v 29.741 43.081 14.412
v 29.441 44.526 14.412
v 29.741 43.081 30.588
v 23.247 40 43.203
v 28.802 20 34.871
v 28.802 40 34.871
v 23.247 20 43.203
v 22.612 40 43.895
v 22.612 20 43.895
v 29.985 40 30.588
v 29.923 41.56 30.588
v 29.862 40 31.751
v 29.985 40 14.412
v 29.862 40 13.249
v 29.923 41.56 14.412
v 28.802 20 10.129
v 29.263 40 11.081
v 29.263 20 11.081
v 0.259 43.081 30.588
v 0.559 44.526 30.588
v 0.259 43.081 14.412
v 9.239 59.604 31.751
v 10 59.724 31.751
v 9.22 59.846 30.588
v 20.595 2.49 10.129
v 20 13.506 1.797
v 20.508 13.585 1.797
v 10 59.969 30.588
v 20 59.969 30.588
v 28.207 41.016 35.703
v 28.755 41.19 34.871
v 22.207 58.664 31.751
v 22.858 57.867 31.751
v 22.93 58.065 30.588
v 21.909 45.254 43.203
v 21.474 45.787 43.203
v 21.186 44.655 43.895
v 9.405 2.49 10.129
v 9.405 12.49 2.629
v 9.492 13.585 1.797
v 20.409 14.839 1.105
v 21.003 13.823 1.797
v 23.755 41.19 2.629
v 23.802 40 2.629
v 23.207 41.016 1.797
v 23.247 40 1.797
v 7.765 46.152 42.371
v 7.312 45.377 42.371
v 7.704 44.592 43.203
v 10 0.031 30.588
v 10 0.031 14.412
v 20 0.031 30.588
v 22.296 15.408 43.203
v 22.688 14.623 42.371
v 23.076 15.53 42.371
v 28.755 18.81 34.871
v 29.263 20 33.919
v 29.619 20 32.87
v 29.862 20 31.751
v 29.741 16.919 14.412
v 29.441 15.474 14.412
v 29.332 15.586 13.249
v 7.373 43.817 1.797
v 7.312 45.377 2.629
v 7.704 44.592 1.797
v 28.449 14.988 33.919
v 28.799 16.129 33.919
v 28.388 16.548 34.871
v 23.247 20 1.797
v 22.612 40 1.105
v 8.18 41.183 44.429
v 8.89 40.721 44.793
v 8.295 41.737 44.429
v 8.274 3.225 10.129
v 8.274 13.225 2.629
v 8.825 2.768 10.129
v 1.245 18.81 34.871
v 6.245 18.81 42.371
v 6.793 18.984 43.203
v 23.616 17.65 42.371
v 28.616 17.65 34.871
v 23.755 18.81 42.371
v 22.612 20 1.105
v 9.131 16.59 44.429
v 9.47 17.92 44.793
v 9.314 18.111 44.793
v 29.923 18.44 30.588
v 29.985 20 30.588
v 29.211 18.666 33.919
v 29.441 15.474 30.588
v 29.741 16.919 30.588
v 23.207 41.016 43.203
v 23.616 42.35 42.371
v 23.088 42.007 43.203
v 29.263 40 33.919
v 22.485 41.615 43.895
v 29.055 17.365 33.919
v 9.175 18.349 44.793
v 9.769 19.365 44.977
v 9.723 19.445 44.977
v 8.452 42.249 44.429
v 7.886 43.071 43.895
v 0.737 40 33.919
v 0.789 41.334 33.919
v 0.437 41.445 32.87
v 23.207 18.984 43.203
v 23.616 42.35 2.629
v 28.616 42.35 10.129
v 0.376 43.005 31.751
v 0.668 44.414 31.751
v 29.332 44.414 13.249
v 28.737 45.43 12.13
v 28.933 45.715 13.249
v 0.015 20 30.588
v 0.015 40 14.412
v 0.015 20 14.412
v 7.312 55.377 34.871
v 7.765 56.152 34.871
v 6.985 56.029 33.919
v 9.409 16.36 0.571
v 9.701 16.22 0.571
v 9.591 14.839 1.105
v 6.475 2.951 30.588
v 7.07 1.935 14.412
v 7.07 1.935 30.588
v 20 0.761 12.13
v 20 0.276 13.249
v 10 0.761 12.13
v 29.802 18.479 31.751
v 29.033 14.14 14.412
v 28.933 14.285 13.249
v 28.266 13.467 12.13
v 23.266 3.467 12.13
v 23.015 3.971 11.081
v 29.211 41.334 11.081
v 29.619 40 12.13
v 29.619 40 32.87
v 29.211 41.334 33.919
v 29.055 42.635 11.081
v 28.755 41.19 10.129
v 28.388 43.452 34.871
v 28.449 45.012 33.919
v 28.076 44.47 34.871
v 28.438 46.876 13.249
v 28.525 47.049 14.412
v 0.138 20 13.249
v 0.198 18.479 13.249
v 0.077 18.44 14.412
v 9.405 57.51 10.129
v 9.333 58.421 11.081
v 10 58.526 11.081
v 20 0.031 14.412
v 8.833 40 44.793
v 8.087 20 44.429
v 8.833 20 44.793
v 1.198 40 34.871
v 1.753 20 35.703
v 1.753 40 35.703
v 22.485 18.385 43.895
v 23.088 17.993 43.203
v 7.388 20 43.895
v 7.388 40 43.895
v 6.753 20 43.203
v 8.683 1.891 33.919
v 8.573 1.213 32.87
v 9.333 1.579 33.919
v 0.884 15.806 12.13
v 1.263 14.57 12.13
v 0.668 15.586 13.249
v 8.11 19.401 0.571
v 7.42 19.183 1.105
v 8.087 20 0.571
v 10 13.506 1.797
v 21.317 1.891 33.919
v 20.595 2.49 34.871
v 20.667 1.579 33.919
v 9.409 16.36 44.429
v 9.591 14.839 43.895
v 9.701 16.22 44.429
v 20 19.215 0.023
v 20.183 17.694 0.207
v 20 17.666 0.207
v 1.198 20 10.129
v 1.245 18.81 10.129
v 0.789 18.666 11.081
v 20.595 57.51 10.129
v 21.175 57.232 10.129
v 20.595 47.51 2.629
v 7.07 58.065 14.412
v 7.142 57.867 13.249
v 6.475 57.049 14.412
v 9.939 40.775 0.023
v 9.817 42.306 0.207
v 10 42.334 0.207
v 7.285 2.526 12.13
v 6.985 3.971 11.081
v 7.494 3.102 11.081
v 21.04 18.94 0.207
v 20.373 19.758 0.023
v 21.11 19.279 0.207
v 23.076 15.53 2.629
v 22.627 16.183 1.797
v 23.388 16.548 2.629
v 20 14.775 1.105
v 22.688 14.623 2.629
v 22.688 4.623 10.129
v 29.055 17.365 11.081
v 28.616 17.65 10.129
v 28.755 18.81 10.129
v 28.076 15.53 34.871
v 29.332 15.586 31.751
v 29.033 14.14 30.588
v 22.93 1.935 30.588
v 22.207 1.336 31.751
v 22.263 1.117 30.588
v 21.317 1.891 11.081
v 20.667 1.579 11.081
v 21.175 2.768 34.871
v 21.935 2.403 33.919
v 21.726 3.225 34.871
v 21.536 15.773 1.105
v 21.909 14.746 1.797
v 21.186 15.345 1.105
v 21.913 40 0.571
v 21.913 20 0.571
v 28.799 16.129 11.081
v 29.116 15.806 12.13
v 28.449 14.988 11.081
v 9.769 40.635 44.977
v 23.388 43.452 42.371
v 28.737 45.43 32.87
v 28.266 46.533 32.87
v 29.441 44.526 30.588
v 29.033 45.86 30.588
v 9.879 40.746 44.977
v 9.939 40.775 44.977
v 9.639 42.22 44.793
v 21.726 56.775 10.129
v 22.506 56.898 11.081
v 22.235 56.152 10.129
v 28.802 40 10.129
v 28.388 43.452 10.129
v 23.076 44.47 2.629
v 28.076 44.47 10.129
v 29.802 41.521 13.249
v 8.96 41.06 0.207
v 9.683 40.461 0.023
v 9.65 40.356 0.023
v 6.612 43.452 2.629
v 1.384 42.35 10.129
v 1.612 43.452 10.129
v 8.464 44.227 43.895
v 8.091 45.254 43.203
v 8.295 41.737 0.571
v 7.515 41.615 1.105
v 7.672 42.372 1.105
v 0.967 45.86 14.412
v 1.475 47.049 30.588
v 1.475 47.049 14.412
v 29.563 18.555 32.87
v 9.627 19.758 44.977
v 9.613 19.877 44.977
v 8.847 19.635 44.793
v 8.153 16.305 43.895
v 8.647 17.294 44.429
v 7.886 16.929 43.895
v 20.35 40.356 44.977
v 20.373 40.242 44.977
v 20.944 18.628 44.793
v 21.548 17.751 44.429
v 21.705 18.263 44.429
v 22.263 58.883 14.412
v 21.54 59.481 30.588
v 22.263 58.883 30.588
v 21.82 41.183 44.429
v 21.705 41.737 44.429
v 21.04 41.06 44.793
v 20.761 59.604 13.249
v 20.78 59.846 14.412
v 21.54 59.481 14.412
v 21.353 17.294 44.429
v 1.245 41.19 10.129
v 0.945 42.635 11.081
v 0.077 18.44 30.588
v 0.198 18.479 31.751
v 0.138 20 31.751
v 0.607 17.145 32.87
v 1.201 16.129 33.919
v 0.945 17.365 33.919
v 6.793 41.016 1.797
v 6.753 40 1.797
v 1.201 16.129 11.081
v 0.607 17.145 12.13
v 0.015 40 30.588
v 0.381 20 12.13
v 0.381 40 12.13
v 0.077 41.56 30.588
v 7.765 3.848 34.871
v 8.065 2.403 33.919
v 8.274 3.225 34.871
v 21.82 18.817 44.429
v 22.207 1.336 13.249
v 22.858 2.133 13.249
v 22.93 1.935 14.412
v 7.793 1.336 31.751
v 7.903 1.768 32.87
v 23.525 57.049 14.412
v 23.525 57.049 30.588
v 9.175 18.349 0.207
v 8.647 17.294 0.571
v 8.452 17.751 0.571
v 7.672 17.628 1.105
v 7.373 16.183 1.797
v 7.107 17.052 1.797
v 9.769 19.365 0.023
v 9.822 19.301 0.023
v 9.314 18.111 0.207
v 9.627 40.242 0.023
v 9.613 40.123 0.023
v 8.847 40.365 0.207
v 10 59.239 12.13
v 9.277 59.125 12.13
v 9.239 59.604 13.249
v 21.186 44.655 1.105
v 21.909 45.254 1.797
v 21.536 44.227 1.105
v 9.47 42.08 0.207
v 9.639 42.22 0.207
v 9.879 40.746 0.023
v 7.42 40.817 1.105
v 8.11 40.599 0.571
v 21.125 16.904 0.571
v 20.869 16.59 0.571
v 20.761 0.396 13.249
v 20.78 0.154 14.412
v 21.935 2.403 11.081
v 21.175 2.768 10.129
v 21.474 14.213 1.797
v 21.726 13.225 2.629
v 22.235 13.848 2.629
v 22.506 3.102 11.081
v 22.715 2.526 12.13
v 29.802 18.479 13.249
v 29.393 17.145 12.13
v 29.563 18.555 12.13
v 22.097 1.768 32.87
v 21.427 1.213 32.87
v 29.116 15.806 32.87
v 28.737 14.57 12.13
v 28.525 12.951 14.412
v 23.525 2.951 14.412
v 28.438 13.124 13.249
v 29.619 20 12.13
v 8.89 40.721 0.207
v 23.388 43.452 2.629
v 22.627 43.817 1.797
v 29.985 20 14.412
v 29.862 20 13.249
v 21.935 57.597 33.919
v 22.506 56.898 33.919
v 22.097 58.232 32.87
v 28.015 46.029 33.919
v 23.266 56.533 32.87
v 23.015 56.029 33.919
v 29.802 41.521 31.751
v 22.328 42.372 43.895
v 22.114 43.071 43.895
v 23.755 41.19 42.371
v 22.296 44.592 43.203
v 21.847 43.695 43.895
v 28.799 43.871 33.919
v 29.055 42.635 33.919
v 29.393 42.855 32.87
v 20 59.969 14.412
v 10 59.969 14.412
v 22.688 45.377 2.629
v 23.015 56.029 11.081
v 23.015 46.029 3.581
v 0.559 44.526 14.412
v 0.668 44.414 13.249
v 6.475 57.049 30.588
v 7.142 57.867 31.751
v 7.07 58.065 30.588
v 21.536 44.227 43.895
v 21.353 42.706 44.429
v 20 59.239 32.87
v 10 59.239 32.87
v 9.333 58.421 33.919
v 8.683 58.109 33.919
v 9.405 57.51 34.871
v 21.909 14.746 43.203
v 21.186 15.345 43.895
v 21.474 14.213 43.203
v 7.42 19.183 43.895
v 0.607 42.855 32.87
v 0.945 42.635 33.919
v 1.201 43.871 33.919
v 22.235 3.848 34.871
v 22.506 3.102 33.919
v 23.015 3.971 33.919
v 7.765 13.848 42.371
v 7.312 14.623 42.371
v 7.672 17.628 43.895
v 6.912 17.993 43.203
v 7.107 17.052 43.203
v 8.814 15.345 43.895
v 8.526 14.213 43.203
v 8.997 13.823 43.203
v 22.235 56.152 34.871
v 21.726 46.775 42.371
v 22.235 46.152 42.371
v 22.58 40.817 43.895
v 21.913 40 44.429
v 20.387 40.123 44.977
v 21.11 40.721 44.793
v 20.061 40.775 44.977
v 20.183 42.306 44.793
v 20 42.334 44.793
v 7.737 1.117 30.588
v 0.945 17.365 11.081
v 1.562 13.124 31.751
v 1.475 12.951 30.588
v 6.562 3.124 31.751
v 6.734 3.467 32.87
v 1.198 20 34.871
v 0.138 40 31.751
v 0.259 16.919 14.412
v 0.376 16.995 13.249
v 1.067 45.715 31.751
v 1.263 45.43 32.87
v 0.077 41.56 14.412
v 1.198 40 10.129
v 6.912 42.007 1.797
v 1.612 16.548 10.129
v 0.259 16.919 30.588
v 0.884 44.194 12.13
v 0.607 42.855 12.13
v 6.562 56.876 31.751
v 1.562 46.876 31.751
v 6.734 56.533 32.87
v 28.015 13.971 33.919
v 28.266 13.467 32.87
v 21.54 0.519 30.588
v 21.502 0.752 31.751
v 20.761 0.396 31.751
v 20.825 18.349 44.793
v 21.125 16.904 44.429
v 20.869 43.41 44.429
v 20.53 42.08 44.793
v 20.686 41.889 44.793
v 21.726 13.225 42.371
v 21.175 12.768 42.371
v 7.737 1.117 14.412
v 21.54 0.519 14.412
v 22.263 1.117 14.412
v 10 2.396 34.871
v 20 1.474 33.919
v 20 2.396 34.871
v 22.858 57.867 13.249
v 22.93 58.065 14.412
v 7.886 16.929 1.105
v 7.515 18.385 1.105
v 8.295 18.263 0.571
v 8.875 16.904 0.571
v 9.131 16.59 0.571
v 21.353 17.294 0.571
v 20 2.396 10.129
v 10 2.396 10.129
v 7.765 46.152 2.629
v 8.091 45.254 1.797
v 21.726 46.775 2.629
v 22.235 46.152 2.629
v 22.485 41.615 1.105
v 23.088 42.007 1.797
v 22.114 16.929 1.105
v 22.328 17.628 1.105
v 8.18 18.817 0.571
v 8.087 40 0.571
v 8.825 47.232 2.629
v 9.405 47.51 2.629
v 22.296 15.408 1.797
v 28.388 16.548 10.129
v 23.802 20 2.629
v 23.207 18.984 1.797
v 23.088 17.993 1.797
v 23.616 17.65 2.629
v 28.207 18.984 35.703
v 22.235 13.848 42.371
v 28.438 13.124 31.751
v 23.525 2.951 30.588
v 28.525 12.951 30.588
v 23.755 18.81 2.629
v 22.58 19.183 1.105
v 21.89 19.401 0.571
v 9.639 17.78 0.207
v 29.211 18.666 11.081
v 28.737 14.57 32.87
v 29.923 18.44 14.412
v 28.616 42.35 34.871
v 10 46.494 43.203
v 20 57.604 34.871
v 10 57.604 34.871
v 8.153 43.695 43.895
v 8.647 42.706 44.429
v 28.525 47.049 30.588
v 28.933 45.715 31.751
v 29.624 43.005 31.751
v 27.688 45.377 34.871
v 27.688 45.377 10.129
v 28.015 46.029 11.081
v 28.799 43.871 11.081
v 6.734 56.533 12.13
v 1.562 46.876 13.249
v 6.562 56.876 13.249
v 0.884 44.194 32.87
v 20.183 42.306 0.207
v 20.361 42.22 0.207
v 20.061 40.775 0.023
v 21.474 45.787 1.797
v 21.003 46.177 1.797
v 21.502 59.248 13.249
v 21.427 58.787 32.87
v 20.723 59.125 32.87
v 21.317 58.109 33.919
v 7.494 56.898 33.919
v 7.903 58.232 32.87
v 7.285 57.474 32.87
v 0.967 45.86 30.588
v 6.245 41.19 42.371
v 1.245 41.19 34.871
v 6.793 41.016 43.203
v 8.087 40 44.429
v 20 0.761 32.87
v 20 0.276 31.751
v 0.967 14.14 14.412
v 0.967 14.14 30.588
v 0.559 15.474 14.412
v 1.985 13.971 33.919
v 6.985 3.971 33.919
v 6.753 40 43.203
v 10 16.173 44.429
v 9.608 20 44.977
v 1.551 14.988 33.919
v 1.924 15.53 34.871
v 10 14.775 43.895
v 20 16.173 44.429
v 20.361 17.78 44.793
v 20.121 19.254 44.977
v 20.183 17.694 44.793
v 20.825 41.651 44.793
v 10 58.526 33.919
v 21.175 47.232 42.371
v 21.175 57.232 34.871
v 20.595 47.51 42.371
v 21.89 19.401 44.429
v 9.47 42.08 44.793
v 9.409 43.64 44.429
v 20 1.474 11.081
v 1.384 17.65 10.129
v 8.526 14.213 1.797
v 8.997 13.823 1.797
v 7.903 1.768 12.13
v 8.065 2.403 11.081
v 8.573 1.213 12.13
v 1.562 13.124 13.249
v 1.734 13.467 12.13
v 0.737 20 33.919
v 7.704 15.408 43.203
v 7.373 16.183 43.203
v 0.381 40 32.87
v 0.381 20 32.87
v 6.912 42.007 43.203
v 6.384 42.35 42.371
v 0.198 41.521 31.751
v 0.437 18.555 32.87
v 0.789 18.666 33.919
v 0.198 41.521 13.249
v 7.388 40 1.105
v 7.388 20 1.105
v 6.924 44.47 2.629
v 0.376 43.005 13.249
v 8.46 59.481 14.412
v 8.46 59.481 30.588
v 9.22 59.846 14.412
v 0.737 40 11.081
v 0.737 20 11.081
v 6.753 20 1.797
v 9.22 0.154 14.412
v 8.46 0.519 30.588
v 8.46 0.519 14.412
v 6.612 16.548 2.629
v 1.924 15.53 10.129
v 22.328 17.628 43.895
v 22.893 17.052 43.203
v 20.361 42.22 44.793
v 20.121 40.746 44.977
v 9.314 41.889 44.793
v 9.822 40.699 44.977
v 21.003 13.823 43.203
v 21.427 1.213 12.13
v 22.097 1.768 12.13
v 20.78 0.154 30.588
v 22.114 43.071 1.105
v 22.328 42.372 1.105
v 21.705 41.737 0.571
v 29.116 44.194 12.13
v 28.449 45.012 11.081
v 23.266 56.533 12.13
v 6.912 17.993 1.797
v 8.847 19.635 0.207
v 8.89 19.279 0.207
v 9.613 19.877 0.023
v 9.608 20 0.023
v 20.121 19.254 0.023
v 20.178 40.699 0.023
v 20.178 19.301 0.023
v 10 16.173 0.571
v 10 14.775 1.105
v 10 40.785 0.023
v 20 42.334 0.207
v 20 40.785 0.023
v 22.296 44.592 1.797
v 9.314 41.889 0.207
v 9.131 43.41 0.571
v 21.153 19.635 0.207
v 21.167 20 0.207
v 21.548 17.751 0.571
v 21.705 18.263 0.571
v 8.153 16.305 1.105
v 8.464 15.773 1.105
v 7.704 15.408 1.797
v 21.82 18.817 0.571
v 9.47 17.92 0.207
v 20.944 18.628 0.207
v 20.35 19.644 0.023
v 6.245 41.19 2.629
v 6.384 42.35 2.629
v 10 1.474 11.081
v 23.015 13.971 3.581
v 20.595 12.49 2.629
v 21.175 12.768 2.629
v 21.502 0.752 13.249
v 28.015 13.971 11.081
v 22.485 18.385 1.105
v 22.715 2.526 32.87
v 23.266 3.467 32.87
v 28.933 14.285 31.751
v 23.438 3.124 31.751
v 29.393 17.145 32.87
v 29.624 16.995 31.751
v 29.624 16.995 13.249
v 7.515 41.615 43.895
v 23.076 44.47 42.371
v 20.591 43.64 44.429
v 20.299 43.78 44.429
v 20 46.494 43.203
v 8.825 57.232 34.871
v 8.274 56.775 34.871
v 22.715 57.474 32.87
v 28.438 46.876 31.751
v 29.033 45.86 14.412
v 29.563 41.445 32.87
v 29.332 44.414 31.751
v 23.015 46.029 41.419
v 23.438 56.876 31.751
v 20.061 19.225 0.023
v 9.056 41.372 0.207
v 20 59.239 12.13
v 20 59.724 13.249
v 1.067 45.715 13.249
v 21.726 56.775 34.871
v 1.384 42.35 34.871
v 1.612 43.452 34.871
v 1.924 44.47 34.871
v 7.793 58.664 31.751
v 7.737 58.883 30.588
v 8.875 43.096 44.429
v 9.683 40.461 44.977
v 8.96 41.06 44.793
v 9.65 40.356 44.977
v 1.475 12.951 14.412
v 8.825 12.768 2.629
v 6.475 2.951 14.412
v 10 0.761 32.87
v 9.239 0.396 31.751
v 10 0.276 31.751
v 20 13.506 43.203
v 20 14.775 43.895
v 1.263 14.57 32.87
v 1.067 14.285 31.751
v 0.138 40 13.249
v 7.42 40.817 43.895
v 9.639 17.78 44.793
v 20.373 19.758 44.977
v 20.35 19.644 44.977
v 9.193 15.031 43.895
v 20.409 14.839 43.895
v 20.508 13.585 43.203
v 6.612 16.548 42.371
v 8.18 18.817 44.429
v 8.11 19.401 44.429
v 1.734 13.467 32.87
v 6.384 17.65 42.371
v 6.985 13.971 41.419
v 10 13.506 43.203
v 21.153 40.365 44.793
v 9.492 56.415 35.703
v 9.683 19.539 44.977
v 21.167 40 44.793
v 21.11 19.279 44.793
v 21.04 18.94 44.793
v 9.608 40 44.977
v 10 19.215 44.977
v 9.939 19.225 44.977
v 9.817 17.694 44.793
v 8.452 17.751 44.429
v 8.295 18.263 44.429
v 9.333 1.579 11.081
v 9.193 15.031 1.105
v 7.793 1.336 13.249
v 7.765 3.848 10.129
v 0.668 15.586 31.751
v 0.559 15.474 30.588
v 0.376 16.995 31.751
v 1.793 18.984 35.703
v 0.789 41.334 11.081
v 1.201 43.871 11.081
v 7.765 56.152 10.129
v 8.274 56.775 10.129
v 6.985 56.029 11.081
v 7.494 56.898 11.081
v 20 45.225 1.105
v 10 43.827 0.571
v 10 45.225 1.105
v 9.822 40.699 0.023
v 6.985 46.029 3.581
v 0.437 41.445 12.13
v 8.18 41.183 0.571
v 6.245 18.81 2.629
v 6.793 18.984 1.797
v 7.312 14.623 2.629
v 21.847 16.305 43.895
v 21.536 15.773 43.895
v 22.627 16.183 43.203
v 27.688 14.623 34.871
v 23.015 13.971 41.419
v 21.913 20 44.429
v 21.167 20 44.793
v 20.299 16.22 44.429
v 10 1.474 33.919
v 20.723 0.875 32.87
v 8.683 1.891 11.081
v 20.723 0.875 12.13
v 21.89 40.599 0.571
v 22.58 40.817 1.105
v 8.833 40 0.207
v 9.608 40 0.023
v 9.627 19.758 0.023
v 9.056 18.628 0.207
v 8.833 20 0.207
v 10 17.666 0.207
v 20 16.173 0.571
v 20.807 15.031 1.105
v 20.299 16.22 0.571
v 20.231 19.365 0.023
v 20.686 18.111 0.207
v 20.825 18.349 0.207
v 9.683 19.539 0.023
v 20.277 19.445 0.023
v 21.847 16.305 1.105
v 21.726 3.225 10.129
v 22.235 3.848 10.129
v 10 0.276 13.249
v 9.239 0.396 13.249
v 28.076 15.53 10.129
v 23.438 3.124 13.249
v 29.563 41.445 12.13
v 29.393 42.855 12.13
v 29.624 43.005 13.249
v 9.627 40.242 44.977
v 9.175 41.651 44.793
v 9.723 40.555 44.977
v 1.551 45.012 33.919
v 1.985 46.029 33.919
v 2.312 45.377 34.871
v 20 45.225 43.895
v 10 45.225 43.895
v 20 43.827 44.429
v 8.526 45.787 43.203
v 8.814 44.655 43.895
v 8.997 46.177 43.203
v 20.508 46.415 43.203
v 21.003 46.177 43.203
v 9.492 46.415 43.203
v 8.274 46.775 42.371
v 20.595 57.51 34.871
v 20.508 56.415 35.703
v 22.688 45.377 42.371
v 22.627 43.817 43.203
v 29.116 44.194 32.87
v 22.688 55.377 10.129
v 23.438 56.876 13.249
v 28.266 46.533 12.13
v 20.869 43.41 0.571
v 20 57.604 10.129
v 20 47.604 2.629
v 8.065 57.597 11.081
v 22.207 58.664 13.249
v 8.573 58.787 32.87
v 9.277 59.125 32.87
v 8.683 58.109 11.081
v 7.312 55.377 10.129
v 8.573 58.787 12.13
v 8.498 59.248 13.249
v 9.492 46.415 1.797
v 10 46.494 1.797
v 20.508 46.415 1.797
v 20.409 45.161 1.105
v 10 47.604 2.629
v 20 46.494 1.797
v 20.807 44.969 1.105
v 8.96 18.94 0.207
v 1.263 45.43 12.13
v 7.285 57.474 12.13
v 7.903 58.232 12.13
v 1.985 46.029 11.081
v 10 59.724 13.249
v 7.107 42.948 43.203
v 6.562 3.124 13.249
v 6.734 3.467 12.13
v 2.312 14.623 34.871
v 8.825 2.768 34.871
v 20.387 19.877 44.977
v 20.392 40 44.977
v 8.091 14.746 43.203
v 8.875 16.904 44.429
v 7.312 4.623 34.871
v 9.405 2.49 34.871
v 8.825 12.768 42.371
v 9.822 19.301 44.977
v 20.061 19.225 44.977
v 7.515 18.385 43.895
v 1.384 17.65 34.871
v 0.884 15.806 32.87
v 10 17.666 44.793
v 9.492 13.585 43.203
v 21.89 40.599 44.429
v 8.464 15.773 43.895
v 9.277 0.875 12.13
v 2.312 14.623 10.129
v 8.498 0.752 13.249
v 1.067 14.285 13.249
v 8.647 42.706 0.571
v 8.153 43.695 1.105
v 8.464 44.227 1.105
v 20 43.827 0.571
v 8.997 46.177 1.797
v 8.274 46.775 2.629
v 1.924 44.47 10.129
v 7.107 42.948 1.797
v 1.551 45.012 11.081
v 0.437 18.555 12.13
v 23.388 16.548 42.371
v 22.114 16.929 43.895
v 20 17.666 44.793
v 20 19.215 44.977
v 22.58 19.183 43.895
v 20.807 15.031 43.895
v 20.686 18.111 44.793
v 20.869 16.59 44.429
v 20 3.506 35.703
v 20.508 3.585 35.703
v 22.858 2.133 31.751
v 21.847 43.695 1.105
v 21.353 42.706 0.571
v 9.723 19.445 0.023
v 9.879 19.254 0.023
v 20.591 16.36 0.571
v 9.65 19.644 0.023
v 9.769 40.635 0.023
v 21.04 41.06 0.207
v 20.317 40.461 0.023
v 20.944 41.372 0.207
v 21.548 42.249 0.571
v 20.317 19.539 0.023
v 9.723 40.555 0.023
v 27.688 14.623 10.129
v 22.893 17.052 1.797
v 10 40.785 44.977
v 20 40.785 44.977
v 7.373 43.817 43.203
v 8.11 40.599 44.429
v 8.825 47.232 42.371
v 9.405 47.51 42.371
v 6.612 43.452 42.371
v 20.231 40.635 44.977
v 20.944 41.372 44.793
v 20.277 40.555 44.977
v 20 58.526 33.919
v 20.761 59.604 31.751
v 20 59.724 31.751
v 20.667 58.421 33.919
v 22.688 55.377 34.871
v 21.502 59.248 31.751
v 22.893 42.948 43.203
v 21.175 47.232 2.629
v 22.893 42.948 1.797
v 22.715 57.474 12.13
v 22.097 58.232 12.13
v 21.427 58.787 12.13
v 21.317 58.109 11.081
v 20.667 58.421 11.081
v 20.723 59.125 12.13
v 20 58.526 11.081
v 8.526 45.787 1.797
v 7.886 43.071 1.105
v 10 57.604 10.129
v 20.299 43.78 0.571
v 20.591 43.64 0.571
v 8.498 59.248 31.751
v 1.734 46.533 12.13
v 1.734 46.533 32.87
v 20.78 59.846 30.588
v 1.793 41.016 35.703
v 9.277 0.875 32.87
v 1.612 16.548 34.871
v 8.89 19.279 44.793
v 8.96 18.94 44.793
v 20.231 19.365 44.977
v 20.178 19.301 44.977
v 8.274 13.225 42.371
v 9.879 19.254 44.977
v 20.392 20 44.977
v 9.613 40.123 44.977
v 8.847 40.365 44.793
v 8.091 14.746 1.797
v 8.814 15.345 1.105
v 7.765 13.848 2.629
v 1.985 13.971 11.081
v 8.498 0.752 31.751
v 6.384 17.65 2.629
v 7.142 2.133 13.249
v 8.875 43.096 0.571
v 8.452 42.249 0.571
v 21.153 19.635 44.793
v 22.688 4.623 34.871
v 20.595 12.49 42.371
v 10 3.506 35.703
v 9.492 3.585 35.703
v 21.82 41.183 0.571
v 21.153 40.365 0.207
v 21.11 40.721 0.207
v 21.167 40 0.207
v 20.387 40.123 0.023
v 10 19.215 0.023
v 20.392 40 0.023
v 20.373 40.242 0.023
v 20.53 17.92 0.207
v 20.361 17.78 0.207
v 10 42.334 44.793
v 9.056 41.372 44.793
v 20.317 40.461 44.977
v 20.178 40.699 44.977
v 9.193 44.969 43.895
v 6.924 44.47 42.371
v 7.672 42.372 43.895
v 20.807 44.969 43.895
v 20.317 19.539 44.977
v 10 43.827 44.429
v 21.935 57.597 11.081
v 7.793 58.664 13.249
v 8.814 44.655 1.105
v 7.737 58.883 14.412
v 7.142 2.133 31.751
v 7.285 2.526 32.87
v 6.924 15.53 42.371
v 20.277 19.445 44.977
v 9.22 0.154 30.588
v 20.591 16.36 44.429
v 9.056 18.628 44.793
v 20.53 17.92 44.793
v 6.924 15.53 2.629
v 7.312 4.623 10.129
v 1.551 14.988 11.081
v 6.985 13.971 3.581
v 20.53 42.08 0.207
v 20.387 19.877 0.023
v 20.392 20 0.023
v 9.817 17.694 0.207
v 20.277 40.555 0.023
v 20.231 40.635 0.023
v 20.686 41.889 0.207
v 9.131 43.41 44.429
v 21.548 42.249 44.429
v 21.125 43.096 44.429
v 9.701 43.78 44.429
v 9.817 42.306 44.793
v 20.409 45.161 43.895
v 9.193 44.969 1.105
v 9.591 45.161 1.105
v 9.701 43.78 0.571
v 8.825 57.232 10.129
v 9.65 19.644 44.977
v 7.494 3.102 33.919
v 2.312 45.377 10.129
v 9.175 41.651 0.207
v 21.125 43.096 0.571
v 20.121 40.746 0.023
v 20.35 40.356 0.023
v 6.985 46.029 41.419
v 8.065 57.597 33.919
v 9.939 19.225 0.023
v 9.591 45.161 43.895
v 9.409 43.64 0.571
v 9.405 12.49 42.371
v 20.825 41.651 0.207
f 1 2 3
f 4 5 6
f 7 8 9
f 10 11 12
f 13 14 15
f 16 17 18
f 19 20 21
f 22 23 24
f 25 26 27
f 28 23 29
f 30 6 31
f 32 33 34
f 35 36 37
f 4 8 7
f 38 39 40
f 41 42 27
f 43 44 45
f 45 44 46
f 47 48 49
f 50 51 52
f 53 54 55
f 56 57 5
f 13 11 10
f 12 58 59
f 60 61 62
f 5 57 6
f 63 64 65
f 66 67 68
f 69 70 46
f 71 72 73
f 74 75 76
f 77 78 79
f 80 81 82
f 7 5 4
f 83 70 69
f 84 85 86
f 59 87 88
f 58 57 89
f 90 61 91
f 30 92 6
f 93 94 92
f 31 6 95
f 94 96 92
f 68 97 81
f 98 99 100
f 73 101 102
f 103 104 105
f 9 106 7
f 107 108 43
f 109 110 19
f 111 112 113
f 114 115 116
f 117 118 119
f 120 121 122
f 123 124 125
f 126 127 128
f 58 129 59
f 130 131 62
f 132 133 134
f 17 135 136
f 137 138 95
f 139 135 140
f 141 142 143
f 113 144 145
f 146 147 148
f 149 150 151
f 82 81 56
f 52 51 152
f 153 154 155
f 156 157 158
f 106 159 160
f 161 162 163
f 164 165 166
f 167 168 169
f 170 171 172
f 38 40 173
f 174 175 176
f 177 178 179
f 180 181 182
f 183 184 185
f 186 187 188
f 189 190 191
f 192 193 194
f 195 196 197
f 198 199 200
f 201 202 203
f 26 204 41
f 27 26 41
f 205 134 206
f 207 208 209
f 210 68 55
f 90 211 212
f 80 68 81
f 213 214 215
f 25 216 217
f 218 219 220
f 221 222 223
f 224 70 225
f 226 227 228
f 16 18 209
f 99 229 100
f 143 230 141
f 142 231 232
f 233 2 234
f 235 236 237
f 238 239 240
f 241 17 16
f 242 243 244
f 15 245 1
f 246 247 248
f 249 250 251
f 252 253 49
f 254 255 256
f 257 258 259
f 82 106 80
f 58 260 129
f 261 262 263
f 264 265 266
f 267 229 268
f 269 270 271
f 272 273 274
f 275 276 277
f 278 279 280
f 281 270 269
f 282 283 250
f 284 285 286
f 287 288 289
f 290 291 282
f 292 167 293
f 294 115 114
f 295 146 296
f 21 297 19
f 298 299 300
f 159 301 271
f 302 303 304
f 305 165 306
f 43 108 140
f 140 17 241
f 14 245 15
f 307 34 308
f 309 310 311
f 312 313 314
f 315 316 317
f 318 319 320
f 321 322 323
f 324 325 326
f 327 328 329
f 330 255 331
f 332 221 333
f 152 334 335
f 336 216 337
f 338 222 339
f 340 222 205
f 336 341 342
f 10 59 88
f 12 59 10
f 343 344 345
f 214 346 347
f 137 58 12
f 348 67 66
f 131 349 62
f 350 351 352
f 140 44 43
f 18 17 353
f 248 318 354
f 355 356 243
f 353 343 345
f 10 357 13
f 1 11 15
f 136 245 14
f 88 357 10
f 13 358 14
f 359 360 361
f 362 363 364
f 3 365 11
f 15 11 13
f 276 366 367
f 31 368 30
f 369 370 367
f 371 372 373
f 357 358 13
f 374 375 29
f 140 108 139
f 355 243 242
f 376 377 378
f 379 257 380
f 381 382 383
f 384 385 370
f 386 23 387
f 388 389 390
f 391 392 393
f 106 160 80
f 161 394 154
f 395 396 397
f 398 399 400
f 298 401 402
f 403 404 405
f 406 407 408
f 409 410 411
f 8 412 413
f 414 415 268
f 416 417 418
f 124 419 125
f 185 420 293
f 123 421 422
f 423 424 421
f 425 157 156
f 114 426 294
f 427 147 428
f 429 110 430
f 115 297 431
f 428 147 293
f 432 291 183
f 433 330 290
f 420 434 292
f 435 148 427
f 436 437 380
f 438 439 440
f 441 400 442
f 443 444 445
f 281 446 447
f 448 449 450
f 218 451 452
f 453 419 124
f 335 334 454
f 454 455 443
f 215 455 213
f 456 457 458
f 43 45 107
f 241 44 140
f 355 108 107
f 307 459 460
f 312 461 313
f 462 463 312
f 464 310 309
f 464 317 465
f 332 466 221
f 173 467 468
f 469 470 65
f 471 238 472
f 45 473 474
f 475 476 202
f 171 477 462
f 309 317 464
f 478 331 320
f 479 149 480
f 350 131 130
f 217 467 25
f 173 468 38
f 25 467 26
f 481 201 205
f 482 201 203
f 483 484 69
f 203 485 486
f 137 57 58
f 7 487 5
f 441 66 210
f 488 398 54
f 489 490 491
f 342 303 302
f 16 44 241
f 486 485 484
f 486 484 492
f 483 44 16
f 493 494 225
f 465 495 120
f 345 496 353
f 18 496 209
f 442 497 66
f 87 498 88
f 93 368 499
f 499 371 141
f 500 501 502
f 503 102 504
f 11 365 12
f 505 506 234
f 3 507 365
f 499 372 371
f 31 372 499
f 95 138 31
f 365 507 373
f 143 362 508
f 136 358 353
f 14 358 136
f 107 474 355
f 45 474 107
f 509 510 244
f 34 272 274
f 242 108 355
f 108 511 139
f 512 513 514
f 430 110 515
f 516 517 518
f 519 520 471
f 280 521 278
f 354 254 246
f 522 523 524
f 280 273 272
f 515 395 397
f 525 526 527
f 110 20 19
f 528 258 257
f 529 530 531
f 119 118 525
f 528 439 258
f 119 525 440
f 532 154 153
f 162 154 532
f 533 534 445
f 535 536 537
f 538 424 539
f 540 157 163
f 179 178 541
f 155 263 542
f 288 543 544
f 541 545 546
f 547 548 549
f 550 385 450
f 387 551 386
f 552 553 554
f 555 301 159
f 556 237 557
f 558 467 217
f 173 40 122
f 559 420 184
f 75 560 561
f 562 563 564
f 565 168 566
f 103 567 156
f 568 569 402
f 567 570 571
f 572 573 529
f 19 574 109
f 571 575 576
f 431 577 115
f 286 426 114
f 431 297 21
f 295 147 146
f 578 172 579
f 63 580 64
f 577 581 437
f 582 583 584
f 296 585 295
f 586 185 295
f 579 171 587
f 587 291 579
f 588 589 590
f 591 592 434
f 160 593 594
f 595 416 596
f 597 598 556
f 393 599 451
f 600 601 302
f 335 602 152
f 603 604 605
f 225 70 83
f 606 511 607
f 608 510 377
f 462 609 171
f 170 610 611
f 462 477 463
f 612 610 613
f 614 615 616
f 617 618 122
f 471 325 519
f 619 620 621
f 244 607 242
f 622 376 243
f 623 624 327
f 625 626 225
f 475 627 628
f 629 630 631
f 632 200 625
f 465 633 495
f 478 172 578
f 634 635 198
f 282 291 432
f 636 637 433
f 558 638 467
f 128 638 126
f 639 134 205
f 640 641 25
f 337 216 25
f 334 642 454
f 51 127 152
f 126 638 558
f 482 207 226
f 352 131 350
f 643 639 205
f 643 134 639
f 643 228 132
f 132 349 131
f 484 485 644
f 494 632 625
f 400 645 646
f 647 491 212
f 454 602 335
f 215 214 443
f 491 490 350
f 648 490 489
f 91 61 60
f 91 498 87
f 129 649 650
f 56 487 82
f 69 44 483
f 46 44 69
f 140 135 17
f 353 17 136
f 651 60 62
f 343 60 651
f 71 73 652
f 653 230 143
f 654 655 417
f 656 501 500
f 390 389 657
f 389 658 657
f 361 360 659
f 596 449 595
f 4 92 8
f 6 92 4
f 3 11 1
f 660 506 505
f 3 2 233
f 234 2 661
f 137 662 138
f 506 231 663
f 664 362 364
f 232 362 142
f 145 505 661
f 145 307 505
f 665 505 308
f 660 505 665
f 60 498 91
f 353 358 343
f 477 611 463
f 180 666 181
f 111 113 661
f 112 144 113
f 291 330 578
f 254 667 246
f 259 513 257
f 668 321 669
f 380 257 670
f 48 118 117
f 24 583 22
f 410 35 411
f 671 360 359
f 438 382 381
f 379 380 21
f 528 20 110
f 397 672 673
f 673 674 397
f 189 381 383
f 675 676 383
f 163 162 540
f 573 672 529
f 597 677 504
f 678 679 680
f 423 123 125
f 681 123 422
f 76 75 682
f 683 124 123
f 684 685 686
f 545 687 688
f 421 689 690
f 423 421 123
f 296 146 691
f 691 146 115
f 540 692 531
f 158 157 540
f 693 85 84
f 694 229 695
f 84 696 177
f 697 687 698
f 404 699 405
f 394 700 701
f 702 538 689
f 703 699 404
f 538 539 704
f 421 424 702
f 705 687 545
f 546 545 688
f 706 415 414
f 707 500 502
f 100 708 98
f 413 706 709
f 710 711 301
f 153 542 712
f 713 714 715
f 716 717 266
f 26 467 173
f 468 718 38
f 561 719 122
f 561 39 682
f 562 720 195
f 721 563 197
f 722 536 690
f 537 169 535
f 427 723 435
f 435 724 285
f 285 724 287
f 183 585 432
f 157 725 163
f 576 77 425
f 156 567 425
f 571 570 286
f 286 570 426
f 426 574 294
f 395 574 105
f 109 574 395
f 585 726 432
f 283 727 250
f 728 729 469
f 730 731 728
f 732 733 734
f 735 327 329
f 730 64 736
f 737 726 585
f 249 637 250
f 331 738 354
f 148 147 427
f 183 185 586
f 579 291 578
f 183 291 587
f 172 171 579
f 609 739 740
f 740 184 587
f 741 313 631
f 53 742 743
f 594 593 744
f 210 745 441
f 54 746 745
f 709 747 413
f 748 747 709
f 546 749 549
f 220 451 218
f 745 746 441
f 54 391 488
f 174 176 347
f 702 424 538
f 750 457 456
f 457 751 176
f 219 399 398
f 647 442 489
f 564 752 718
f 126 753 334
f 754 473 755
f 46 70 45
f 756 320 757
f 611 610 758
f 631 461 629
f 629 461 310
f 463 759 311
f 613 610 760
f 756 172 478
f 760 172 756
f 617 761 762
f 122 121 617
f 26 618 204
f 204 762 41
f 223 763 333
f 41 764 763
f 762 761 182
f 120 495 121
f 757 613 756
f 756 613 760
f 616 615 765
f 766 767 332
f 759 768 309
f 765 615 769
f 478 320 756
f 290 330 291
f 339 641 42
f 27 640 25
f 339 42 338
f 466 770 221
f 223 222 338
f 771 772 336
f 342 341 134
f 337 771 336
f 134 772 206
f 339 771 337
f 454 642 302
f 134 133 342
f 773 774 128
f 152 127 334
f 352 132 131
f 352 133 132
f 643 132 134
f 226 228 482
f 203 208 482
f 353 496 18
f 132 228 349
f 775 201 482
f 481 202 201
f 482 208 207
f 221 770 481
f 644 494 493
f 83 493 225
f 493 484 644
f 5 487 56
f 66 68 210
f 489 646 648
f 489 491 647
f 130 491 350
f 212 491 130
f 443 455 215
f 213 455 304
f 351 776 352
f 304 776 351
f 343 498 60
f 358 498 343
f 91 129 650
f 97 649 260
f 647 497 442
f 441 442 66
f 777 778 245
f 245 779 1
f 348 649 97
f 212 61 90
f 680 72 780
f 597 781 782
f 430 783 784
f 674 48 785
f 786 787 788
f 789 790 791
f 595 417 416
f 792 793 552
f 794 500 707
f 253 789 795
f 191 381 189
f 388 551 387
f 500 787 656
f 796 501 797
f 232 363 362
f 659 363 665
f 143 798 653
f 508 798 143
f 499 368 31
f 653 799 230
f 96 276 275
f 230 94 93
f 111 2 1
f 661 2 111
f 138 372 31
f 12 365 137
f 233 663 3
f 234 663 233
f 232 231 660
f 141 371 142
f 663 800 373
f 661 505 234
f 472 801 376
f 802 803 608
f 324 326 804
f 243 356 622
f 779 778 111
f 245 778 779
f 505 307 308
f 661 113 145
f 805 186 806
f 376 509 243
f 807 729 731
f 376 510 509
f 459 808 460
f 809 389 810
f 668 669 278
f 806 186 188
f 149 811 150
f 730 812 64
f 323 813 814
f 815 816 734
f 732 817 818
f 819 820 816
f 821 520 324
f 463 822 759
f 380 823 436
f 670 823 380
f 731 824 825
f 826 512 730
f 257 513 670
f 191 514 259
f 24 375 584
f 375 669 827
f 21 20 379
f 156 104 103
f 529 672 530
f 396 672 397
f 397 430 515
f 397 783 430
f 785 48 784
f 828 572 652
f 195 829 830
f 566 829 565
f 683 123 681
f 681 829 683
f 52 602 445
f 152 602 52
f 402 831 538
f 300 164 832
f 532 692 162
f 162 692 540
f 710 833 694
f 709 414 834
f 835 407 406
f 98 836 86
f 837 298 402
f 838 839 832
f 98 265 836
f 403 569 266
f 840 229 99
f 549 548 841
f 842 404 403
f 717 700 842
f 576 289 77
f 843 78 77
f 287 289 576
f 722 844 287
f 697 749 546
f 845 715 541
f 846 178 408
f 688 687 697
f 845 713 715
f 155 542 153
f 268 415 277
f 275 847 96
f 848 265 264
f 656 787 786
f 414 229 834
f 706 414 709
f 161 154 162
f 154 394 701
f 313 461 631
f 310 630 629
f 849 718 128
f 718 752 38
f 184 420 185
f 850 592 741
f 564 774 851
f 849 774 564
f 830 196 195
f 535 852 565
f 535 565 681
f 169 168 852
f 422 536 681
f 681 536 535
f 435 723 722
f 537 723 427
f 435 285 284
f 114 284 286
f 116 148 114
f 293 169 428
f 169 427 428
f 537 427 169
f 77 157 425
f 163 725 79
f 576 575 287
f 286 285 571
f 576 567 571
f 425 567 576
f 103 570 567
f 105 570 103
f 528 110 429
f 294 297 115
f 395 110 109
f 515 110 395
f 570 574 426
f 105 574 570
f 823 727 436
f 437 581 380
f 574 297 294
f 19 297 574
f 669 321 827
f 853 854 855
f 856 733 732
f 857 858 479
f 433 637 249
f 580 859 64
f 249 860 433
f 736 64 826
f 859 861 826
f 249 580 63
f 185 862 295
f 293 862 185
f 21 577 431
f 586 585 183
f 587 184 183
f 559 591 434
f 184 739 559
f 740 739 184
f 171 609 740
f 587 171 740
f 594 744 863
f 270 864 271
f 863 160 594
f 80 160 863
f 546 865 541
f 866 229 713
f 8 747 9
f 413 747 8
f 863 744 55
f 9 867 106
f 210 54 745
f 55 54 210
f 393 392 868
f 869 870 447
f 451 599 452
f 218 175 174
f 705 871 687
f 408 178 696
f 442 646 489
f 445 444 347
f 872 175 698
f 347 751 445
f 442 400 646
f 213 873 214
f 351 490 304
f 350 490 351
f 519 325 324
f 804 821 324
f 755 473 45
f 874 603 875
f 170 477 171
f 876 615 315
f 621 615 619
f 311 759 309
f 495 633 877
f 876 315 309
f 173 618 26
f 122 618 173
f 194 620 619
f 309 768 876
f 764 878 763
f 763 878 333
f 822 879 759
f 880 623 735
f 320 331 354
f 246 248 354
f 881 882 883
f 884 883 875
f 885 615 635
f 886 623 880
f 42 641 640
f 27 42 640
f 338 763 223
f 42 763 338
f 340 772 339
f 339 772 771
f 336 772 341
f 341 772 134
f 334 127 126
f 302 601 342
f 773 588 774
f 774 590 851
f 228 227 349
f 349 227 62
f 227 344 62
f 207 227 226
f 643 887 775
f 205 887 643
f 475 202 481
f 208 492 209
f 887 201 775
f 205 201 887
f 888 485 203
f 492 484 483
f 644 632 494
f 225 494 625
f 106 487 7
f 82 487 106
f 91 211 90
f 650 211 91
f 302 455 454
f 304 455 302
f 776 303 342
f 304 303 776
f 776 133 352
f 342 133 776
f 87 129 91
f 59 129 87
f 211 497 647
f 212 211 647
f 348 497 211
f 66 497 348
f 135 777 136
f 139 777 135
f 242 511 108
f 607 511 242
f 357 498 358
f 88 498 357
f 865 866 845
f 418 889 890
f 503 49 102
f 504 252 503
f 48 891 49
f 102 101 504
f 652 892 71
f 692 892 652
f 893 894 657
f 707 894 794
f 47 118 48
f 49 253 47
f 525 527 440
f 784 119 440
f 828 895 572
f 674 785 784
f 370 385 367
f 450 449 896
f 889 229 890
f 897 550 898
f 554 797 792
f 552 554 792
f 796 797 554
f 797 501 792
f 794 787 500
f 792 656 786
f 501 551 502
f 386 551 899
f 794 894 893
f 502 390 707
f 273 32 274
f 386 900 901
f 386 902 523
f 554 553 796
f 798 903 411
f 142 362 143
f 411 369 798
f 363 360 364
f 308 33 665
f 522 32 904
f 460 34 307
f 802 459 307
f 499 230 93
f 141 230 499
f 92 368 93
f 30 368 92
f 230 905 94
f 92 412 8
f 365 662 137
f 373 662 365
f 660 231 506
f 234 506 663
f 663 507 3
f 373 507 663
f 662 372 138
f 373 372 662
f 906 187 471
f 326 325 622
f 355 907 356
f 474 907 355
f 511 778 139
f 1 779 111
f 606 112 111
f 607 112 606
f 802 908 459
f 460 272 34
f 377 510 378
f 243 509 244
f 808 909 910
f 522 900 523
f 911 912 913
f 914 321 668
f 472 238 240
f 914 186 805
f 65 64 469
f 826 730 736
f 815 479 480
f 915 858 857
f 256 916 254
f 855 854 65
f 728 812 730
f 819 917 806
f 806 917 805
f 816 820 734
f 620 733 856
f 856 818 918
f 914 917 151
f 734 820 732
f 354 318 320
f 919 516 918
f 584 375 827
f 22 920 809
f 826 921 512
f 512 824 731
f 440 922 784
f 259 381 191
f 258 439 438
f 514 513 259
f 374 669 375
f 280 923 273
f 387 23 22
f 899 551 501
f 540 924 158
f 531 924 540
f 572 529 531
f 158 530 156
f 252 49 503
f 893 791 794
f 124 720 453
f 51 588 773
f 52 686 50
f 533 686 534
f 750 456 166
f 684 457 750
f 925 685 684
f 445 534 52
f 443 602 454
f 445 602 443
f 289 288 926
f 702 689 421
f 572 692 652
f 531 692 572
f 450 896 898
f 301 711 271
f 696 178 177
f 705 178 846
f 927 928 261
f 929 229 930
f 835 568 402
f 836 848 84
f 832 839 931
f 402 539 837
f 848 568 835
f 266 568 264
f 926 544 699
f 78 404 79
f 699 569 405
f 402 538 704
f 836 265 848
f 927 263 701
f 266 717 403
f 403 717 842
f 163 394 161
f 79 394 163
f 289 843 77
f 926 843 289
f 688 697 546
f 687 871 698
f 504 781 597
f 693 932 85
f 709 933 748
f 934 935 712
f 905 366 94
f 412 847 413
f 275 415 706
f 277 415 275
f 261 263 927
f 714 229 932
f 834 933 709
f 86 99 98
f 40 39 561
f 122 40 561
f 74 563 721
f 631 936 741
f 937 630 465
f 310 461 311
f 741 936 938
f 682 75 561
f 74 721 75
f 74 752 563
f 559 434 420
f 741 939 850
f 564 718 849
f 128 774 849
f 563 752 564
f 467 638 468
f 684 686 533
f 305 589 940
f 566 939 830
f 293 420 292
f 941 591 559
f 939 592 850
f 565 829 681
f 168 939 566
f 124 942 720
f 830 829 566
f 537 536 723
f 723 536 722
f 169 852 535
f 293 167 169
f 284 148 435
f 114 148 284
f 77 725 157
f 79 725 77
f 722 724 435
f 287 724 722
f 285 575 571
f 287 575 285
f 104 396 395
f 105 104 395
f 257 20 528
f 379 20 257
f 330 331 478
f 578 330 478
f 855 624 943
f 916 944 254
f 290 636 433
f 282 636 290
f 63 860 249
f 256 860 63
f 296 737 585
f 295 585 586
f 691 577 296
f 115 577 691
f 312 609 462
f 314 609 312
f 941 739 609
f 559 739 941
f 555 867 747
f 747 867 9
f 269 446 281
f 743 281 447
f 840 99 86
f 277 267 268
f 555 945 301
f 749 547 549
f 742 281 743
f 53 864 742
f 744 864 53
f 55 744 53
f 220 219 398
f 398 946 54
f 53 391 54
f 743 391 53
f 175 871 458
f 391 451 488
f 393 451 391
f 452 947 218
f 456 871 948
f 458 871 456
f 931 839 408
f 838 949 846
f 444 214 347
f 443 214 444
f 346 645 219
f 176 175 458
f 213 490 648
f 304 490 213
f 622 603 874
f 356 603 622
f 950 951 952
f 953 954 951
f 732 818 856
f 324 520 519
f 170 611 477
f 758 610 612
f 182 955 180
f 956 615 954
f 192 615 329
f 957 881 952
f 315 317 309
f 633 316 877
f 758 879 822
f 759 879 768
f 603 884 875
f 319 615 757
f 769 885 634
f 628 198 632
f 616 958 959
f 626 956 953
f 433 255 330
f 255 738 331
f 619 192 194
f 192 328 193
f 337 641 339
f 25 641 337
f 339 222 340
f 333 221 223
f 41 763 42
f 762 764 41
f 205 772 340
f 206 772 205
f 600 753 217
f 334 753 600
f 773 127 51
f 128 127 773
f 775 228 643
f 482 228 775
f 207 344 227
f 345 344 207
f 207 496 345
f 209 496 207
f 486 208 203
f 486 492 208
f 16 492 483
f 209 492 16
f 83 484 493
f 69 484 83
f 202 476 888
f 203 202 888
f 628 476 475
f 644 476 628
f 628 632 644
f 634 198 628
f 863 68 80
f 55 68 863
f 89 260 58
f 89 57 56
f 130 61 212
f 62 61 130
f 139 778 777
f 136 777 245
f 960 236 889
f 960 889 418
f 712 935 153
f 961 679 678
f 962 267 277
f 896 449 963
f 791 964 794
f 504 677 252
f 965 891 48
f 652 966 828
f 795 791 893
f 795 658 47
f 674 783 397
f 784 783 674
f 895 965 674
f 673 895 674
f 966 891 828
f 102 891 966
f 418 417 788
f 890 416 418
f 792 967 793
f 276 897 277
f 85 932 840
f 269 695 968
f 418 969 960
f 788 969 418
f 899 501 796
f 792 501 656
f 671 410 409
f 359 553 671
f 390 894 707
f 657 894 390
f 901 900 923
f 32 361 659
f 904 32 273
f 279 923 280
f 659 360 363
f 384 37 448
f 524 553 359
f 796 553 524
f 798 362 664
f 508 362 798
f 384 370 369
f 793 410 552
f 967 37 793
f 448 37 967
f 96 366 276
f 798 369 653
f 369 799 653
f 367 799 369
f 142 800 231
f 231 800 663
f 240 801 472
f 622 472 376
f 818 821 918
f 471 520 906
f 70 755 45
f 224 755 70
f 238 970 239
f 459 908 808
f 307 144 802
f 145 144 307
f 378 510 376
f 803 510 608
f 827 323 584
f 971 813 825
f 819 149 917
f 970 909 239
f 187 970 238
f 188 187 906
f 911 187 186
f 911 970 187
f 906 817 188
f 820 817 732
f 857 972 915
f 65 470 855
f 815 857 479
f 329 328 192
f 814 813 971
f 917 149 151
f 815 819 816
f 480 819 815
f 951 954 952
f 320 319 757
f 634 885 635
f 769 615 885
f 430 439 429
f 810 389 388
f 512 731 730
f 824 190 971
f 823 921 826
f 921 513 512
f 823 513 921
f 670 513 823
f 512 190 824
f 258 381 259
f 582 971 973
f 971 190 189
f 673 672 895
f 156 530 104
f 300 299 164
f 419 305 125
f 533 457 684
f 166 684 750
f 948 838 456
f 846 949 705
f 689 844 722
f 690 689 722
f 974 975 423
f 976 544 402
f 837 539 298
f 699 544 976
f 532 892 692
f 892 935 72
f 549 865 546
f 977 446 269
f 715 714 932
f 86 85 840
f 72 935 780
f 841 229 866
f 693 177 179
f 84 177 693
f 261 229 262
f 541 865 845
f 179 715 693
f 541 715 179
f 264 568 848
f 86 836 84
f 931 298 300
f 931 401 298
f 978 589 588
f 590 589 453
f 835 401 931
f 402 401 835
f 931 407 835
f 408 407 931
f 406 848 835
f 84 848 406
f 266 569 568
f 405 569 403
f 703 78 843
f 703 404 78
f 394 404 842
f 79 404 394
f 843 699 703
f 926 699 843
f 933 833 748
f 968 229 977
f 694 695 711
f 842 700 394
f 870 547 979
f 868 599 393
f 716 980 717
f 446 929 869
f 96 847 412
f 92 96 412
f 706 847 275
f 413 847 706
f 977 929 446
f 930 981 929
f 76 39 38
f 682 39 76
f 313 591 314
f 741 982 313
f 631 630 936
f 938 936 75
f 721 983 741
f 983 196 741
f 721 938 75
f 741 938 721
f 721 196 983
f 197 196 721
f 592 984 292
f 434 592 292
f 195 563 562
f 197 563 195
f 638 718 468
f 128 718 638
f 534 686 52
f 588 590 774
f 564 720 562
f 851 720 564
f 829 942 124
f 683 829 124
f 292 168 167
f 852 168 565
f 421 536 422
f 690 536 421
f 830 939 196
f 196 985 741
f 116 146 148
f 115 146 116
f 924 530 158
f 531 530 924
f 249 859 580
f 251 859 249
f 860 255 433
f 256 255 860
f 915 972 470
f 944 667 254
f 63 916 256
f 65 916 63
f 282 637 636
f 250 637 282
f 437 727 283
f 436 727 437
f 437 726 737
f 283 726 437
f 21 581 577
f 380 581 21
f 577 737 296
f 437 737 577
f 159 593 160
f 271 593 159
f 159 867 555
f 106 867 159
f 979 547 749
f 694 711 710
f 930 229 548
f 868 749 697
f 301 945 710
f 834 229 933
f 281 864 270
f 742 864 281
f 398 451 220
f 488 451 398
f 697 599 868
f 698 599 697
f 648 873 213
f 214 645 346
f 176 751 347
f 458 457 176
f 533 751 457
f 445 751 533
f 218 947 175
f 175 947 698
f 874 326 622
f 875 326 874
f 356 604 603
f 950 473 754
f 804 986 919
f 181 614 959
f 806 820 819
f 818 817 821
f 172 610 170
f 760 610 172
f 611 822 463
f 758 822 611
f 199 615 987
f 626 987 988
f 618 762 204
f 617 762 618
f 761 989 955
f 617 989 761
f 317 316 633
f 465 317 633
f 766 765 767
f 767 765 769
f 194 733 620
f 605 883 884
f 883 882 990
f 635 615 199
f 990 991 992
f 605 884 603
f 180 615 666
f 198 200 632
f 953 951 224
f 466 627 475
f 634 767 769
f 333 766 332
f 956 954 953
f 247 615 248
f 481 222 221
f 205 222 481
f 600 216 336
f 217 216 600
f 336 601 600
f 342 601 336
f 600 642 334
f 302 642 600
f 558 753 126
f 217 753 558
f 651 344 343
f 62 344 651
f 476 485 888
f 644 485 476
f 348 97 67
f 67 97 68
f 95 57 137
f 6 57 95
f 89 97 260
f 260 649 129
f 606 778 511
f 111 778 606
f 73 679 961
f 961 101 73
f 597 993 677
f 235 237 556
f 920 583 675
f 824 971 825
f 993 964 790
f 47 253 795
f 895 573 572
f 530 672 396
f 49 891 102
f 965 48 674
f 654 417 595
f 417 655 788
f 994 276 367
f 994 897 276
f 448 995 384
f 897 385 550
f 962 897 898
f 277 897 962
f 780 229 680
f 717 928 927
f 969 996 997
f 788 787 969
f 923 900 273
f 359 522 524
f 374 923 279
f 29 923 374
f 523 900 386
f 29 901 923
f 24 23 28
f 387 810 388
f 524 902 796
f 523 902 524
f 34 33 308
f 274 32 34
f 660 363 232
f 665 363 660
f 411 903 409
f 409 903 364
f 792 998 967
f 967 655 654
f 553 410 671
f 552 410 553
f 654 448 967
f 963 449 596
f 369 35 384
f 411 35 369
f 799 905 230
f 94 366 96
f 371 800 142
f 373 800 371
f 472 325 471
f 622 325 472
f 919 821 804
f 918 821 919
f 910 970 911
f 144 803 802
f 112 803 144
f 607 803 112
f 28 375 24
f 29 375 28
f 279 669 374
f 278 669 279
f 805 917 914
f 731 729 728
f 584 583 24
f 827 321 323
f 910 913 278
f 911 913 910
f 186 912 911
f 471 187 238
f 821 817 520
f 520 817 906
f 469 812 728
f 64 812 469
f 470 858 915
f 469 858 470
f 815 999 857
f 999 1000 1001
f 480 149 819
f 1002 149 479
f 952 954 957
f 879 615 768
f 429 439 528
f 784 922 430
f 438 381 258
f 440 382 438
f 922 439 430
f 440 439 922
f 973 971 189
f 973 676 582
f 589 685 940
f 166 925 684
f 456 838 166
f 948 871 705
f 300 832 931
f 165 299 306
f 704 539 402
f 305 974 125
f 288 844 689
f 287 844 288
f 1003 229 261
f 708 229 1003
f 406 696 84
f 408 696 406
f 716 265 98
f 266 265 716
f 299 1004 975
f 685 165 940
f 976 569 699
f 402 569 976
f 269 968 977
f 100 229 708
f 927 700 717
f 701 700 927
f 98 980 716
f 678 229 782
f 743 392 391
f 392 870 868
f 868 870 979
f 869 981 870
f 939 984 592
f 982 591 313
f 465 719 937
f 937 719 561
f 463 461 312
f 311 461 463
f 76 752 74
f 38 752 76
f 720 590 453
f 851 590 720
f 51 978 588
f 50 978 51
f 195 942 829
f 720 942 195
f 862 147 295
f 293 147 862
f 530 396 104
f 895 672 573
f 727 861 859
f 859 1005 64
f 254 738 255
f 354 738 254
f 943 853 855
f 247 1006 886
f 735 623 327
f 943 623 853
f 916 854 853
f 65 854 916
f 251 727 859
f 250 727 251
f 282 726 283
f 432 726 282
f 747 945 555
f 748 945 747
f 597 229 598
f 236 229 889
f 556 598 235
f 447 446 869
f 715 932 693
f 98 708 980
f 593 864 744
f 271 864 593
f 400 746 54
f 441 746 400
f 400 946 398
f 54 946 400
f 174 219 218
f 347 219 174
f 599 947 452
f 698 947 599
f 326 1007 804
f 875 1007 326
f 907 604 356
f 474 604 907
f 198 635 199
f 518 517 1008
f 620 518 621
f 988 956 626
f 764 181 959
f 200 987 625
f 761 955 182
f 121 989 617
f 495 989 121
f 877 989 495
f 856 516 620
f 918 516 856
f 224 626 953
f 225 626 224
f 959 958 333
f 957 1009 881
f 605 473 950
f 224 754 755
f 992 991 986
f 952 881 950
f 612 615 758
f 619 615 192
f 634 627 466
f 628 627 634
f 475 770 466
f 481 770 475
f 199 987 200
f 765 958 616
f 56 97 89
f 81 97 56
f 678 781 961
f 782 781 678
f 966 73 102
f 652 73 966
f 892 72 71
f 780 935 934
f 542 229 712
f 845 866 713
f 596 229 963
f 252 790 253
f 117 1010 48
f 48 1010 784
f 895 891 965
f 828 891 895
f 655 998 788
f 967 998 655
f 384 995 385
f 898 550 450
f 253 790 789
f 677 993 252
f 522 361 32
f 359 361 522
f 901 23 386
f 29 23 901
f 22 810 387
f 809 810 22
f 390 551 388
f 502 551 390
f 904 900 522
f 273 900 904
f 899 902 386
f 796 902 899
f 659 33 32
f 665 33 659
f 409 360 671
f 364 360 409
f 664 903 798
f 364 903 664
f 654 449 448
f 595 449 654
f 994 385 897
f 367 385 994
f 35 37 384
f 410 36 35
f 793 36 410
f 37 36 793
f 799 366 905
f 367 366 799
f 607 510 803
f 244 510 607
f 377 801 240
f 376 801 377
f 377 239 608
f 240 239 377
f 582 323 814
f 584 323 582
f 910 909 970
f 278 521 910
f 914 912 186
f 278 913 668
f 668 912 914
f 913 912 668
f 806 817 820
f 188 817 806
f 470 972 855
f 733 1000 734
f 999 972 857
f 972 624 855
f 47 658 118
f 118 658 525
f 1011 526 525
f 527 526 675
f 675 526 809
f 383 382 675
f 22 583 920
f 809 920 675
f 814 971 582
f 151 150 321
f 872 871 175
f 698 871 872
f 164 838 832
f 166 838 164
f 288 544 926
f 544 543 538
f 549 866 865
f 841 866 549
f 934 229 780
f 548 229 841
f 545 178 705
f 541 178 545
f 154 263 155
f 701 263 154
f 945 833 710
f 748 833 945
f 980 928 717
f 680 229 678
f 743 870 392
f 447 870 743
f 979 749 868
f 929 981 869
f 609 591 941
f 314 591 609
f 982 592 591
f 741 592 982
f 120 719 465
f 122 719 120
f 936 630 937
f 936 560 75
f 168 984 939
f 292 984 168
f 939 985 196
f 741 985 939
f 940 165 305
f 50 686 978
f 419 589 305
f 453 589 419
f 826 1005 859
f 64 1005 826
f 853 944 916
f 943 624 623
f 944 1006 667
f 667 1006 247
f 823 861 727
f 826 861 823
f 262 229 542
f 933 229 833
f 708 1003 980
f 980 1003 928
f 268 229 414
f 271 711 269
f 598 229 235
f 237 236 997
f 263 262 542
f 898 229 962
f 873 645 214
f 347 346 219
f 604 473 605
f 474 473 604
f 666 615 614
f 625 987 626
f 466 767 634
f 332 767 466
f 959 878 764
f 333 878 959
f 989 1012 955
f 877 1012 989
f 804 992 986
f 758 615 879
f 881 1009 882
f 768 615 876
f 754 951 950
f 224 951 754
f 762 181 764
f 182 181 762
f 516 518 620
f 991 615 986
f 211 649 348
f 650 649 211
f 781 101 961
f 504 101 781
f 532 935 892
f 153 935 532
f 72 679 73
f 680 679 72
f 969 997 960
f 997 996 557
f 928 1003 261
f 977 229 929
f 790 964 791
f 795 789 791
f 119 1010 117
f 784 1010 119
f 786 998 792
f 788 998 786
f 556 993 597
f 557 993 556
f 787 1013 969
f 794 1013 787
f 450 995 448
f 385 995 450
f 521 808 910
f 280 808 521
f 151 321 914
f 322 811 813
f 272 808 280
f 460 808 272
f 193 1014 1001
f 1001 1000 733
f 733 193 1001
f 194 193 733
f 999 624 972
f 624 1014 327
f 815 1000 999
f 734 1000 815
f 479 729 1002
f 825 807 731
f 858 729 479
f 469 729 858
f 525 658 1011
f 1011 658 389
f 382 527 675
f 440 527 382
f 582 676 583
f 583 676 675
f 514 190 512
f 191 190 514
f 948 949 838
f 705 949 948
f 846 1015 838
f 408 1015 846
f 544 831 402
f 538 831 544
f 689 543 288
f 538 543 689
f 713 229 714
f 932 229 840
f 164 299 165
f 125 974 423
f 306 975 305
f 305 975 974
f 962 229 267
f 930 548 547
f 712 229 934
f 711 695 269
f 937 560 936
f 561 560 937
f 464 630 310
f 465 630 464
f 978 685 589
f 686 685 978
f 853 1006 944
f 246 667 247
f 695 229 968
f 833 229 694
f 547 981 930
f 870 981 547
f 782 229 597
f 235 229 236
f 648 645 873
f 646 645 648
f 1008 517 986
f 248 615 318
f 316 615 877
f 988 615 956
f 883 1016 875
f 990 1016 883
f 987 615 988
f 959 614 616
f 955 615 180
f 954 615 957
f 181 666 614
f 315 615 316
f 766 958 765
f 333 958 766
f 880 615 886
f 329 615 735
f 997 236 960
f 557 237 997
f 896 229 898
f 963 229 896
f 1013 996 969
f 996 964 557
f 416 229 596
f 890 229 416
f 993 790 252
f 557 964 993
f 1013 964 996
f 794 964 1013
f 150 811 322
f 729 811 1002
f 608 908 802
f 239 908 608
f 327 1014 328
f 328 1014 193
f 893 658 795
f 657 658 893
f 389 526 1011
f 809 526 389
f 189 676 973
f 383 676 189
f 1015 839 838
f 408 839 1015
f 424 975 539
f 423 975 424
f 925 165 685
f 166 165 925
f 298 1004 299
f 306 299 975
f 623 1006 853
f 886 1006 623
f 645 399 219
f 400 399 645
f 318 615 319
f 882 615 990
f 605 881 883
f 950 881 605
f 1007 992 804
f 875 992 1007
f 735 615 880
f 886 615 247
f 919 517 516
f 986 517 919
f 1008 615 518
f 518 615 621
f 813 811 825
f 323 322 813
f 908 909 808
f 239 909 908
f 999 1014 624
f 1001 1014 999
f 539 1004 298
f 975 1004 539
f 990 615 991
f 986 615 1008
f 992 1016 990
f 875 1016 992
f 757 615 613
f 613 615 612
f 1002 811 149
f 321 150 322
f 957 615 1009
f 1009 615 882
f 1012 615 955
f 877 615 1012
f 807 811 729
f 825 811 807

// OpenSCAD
echo(un([1,1,0])); 
x=rnd(30,30);
y=rnd(x,30);
z=rnd(y,30);
 
cx=rnd(5,5);
cy=rnd(5,5);
cz=rnd(5,5); 
rx=5;
ry=5;//rnd(1,cy);
rz=5;//rnd(1,cz);
$fn=40;
color ("Wheat")scale([1,2,1.5])chamferroundbox(x,y,z,cx,cy,cz,rx,ry,rz);
echo(x,y,z,cx,cy,cz,rx,ry,rz);



module chamferroundbox(x,y,z,cx,cy,cz,rx,ry,rz,)
{hull(){
translate ([0,cy,cz]) roundbox(x,y-cy*2,z-cz*2,rx,ry,rz);
translate ([cx,0,cz]) roundbox(x-cx*2,y,z-cz*2,rx,ry,rz);
translate ([cx,cy,0]) roundbox(x-cx*2,y-cy*2,z,rx,ry,rz);
 
}}
module roundbox(x,y,z,rx,ry,rz)
{hull(){
translate ([rx,y-ry,rz])scale([rx,ry,rz])sphere(1);
translate ([rx,ry,rz])scale([rx,ry,rz])sphere(1);
translate ([x-rx,ry,rz])scale([rx,ry,rz])sphere(1);
translate ([x-rx,y-ry,rz])scale([rx,ry,rz])sphere(1);
translate ([0+rx,y-ry,z-rz])scale([rx,ry,rz])sphere(1);
translate ([0+rx,0+ry,z-rz])scale([rx,ry,rz])sphere(1);
translate ([x-rx,0+ry,z-rz])scale([rx,ry,rz])sphere(1);
translate ([x-rx,y-ry,z-rz])scale([rx,ry,rz])sphere(1);
}}



function max3(v,l)=[for(i=[0:len(v)-1])max(l,v[i]) ];
function min3(v,l)=[for(i=[0:len(v)-1])min(l,v[i]) ];
function len3(v) =len(v)>1?sqrt(addl([for(i=[0:len(v)-1])pow(v[i], 2)])):len(v)==1?v[0]:v; 
function addl(l,c=0)=c<len(l)-1?l[c]+addl(l,c+1):l[c];
 function dot(u,v) = u[0]*v[0]+u[1]*v[1]+u[2]*v[2];
function un(v)=v/max(len3(v),0.000001)*1;
function p2n(pa,pb,pc)=let(u=pa-pb,v=pa-pc)un([u[1]*v[2]-u[2]*v[1],u[2]*v[0]-u[0]*v[2],u[0]*v[1]-u[1]*v[0]]);

function rnd(a=0,b=1)=round(rands(min(a,b),max(a,b),1)[0]);
function rndc()=[rands(0,1,1)[0],rands(0,1,1)[0],rands(0,1,1)[0]];
module trender(t){C0=(un(rndc())+[2,0,0]);C1=(un(rndc())+[2,2,0]);C2=(un(rndc())+[0,2,2]);for(i=[0:max(0,len(t[1])-1)]){ n=un(p2n(t[0][t[1][i][0]],t[0][t[1][i][1]],t[0][t[1][i][2]]));color(un((C0*abs(n[0])+C1*abs(n[1])+C2*abs(n[2])+[1,1,1]*abs(n[2]))/4))polyhedron(t[0],[t[1][i]]);}}
